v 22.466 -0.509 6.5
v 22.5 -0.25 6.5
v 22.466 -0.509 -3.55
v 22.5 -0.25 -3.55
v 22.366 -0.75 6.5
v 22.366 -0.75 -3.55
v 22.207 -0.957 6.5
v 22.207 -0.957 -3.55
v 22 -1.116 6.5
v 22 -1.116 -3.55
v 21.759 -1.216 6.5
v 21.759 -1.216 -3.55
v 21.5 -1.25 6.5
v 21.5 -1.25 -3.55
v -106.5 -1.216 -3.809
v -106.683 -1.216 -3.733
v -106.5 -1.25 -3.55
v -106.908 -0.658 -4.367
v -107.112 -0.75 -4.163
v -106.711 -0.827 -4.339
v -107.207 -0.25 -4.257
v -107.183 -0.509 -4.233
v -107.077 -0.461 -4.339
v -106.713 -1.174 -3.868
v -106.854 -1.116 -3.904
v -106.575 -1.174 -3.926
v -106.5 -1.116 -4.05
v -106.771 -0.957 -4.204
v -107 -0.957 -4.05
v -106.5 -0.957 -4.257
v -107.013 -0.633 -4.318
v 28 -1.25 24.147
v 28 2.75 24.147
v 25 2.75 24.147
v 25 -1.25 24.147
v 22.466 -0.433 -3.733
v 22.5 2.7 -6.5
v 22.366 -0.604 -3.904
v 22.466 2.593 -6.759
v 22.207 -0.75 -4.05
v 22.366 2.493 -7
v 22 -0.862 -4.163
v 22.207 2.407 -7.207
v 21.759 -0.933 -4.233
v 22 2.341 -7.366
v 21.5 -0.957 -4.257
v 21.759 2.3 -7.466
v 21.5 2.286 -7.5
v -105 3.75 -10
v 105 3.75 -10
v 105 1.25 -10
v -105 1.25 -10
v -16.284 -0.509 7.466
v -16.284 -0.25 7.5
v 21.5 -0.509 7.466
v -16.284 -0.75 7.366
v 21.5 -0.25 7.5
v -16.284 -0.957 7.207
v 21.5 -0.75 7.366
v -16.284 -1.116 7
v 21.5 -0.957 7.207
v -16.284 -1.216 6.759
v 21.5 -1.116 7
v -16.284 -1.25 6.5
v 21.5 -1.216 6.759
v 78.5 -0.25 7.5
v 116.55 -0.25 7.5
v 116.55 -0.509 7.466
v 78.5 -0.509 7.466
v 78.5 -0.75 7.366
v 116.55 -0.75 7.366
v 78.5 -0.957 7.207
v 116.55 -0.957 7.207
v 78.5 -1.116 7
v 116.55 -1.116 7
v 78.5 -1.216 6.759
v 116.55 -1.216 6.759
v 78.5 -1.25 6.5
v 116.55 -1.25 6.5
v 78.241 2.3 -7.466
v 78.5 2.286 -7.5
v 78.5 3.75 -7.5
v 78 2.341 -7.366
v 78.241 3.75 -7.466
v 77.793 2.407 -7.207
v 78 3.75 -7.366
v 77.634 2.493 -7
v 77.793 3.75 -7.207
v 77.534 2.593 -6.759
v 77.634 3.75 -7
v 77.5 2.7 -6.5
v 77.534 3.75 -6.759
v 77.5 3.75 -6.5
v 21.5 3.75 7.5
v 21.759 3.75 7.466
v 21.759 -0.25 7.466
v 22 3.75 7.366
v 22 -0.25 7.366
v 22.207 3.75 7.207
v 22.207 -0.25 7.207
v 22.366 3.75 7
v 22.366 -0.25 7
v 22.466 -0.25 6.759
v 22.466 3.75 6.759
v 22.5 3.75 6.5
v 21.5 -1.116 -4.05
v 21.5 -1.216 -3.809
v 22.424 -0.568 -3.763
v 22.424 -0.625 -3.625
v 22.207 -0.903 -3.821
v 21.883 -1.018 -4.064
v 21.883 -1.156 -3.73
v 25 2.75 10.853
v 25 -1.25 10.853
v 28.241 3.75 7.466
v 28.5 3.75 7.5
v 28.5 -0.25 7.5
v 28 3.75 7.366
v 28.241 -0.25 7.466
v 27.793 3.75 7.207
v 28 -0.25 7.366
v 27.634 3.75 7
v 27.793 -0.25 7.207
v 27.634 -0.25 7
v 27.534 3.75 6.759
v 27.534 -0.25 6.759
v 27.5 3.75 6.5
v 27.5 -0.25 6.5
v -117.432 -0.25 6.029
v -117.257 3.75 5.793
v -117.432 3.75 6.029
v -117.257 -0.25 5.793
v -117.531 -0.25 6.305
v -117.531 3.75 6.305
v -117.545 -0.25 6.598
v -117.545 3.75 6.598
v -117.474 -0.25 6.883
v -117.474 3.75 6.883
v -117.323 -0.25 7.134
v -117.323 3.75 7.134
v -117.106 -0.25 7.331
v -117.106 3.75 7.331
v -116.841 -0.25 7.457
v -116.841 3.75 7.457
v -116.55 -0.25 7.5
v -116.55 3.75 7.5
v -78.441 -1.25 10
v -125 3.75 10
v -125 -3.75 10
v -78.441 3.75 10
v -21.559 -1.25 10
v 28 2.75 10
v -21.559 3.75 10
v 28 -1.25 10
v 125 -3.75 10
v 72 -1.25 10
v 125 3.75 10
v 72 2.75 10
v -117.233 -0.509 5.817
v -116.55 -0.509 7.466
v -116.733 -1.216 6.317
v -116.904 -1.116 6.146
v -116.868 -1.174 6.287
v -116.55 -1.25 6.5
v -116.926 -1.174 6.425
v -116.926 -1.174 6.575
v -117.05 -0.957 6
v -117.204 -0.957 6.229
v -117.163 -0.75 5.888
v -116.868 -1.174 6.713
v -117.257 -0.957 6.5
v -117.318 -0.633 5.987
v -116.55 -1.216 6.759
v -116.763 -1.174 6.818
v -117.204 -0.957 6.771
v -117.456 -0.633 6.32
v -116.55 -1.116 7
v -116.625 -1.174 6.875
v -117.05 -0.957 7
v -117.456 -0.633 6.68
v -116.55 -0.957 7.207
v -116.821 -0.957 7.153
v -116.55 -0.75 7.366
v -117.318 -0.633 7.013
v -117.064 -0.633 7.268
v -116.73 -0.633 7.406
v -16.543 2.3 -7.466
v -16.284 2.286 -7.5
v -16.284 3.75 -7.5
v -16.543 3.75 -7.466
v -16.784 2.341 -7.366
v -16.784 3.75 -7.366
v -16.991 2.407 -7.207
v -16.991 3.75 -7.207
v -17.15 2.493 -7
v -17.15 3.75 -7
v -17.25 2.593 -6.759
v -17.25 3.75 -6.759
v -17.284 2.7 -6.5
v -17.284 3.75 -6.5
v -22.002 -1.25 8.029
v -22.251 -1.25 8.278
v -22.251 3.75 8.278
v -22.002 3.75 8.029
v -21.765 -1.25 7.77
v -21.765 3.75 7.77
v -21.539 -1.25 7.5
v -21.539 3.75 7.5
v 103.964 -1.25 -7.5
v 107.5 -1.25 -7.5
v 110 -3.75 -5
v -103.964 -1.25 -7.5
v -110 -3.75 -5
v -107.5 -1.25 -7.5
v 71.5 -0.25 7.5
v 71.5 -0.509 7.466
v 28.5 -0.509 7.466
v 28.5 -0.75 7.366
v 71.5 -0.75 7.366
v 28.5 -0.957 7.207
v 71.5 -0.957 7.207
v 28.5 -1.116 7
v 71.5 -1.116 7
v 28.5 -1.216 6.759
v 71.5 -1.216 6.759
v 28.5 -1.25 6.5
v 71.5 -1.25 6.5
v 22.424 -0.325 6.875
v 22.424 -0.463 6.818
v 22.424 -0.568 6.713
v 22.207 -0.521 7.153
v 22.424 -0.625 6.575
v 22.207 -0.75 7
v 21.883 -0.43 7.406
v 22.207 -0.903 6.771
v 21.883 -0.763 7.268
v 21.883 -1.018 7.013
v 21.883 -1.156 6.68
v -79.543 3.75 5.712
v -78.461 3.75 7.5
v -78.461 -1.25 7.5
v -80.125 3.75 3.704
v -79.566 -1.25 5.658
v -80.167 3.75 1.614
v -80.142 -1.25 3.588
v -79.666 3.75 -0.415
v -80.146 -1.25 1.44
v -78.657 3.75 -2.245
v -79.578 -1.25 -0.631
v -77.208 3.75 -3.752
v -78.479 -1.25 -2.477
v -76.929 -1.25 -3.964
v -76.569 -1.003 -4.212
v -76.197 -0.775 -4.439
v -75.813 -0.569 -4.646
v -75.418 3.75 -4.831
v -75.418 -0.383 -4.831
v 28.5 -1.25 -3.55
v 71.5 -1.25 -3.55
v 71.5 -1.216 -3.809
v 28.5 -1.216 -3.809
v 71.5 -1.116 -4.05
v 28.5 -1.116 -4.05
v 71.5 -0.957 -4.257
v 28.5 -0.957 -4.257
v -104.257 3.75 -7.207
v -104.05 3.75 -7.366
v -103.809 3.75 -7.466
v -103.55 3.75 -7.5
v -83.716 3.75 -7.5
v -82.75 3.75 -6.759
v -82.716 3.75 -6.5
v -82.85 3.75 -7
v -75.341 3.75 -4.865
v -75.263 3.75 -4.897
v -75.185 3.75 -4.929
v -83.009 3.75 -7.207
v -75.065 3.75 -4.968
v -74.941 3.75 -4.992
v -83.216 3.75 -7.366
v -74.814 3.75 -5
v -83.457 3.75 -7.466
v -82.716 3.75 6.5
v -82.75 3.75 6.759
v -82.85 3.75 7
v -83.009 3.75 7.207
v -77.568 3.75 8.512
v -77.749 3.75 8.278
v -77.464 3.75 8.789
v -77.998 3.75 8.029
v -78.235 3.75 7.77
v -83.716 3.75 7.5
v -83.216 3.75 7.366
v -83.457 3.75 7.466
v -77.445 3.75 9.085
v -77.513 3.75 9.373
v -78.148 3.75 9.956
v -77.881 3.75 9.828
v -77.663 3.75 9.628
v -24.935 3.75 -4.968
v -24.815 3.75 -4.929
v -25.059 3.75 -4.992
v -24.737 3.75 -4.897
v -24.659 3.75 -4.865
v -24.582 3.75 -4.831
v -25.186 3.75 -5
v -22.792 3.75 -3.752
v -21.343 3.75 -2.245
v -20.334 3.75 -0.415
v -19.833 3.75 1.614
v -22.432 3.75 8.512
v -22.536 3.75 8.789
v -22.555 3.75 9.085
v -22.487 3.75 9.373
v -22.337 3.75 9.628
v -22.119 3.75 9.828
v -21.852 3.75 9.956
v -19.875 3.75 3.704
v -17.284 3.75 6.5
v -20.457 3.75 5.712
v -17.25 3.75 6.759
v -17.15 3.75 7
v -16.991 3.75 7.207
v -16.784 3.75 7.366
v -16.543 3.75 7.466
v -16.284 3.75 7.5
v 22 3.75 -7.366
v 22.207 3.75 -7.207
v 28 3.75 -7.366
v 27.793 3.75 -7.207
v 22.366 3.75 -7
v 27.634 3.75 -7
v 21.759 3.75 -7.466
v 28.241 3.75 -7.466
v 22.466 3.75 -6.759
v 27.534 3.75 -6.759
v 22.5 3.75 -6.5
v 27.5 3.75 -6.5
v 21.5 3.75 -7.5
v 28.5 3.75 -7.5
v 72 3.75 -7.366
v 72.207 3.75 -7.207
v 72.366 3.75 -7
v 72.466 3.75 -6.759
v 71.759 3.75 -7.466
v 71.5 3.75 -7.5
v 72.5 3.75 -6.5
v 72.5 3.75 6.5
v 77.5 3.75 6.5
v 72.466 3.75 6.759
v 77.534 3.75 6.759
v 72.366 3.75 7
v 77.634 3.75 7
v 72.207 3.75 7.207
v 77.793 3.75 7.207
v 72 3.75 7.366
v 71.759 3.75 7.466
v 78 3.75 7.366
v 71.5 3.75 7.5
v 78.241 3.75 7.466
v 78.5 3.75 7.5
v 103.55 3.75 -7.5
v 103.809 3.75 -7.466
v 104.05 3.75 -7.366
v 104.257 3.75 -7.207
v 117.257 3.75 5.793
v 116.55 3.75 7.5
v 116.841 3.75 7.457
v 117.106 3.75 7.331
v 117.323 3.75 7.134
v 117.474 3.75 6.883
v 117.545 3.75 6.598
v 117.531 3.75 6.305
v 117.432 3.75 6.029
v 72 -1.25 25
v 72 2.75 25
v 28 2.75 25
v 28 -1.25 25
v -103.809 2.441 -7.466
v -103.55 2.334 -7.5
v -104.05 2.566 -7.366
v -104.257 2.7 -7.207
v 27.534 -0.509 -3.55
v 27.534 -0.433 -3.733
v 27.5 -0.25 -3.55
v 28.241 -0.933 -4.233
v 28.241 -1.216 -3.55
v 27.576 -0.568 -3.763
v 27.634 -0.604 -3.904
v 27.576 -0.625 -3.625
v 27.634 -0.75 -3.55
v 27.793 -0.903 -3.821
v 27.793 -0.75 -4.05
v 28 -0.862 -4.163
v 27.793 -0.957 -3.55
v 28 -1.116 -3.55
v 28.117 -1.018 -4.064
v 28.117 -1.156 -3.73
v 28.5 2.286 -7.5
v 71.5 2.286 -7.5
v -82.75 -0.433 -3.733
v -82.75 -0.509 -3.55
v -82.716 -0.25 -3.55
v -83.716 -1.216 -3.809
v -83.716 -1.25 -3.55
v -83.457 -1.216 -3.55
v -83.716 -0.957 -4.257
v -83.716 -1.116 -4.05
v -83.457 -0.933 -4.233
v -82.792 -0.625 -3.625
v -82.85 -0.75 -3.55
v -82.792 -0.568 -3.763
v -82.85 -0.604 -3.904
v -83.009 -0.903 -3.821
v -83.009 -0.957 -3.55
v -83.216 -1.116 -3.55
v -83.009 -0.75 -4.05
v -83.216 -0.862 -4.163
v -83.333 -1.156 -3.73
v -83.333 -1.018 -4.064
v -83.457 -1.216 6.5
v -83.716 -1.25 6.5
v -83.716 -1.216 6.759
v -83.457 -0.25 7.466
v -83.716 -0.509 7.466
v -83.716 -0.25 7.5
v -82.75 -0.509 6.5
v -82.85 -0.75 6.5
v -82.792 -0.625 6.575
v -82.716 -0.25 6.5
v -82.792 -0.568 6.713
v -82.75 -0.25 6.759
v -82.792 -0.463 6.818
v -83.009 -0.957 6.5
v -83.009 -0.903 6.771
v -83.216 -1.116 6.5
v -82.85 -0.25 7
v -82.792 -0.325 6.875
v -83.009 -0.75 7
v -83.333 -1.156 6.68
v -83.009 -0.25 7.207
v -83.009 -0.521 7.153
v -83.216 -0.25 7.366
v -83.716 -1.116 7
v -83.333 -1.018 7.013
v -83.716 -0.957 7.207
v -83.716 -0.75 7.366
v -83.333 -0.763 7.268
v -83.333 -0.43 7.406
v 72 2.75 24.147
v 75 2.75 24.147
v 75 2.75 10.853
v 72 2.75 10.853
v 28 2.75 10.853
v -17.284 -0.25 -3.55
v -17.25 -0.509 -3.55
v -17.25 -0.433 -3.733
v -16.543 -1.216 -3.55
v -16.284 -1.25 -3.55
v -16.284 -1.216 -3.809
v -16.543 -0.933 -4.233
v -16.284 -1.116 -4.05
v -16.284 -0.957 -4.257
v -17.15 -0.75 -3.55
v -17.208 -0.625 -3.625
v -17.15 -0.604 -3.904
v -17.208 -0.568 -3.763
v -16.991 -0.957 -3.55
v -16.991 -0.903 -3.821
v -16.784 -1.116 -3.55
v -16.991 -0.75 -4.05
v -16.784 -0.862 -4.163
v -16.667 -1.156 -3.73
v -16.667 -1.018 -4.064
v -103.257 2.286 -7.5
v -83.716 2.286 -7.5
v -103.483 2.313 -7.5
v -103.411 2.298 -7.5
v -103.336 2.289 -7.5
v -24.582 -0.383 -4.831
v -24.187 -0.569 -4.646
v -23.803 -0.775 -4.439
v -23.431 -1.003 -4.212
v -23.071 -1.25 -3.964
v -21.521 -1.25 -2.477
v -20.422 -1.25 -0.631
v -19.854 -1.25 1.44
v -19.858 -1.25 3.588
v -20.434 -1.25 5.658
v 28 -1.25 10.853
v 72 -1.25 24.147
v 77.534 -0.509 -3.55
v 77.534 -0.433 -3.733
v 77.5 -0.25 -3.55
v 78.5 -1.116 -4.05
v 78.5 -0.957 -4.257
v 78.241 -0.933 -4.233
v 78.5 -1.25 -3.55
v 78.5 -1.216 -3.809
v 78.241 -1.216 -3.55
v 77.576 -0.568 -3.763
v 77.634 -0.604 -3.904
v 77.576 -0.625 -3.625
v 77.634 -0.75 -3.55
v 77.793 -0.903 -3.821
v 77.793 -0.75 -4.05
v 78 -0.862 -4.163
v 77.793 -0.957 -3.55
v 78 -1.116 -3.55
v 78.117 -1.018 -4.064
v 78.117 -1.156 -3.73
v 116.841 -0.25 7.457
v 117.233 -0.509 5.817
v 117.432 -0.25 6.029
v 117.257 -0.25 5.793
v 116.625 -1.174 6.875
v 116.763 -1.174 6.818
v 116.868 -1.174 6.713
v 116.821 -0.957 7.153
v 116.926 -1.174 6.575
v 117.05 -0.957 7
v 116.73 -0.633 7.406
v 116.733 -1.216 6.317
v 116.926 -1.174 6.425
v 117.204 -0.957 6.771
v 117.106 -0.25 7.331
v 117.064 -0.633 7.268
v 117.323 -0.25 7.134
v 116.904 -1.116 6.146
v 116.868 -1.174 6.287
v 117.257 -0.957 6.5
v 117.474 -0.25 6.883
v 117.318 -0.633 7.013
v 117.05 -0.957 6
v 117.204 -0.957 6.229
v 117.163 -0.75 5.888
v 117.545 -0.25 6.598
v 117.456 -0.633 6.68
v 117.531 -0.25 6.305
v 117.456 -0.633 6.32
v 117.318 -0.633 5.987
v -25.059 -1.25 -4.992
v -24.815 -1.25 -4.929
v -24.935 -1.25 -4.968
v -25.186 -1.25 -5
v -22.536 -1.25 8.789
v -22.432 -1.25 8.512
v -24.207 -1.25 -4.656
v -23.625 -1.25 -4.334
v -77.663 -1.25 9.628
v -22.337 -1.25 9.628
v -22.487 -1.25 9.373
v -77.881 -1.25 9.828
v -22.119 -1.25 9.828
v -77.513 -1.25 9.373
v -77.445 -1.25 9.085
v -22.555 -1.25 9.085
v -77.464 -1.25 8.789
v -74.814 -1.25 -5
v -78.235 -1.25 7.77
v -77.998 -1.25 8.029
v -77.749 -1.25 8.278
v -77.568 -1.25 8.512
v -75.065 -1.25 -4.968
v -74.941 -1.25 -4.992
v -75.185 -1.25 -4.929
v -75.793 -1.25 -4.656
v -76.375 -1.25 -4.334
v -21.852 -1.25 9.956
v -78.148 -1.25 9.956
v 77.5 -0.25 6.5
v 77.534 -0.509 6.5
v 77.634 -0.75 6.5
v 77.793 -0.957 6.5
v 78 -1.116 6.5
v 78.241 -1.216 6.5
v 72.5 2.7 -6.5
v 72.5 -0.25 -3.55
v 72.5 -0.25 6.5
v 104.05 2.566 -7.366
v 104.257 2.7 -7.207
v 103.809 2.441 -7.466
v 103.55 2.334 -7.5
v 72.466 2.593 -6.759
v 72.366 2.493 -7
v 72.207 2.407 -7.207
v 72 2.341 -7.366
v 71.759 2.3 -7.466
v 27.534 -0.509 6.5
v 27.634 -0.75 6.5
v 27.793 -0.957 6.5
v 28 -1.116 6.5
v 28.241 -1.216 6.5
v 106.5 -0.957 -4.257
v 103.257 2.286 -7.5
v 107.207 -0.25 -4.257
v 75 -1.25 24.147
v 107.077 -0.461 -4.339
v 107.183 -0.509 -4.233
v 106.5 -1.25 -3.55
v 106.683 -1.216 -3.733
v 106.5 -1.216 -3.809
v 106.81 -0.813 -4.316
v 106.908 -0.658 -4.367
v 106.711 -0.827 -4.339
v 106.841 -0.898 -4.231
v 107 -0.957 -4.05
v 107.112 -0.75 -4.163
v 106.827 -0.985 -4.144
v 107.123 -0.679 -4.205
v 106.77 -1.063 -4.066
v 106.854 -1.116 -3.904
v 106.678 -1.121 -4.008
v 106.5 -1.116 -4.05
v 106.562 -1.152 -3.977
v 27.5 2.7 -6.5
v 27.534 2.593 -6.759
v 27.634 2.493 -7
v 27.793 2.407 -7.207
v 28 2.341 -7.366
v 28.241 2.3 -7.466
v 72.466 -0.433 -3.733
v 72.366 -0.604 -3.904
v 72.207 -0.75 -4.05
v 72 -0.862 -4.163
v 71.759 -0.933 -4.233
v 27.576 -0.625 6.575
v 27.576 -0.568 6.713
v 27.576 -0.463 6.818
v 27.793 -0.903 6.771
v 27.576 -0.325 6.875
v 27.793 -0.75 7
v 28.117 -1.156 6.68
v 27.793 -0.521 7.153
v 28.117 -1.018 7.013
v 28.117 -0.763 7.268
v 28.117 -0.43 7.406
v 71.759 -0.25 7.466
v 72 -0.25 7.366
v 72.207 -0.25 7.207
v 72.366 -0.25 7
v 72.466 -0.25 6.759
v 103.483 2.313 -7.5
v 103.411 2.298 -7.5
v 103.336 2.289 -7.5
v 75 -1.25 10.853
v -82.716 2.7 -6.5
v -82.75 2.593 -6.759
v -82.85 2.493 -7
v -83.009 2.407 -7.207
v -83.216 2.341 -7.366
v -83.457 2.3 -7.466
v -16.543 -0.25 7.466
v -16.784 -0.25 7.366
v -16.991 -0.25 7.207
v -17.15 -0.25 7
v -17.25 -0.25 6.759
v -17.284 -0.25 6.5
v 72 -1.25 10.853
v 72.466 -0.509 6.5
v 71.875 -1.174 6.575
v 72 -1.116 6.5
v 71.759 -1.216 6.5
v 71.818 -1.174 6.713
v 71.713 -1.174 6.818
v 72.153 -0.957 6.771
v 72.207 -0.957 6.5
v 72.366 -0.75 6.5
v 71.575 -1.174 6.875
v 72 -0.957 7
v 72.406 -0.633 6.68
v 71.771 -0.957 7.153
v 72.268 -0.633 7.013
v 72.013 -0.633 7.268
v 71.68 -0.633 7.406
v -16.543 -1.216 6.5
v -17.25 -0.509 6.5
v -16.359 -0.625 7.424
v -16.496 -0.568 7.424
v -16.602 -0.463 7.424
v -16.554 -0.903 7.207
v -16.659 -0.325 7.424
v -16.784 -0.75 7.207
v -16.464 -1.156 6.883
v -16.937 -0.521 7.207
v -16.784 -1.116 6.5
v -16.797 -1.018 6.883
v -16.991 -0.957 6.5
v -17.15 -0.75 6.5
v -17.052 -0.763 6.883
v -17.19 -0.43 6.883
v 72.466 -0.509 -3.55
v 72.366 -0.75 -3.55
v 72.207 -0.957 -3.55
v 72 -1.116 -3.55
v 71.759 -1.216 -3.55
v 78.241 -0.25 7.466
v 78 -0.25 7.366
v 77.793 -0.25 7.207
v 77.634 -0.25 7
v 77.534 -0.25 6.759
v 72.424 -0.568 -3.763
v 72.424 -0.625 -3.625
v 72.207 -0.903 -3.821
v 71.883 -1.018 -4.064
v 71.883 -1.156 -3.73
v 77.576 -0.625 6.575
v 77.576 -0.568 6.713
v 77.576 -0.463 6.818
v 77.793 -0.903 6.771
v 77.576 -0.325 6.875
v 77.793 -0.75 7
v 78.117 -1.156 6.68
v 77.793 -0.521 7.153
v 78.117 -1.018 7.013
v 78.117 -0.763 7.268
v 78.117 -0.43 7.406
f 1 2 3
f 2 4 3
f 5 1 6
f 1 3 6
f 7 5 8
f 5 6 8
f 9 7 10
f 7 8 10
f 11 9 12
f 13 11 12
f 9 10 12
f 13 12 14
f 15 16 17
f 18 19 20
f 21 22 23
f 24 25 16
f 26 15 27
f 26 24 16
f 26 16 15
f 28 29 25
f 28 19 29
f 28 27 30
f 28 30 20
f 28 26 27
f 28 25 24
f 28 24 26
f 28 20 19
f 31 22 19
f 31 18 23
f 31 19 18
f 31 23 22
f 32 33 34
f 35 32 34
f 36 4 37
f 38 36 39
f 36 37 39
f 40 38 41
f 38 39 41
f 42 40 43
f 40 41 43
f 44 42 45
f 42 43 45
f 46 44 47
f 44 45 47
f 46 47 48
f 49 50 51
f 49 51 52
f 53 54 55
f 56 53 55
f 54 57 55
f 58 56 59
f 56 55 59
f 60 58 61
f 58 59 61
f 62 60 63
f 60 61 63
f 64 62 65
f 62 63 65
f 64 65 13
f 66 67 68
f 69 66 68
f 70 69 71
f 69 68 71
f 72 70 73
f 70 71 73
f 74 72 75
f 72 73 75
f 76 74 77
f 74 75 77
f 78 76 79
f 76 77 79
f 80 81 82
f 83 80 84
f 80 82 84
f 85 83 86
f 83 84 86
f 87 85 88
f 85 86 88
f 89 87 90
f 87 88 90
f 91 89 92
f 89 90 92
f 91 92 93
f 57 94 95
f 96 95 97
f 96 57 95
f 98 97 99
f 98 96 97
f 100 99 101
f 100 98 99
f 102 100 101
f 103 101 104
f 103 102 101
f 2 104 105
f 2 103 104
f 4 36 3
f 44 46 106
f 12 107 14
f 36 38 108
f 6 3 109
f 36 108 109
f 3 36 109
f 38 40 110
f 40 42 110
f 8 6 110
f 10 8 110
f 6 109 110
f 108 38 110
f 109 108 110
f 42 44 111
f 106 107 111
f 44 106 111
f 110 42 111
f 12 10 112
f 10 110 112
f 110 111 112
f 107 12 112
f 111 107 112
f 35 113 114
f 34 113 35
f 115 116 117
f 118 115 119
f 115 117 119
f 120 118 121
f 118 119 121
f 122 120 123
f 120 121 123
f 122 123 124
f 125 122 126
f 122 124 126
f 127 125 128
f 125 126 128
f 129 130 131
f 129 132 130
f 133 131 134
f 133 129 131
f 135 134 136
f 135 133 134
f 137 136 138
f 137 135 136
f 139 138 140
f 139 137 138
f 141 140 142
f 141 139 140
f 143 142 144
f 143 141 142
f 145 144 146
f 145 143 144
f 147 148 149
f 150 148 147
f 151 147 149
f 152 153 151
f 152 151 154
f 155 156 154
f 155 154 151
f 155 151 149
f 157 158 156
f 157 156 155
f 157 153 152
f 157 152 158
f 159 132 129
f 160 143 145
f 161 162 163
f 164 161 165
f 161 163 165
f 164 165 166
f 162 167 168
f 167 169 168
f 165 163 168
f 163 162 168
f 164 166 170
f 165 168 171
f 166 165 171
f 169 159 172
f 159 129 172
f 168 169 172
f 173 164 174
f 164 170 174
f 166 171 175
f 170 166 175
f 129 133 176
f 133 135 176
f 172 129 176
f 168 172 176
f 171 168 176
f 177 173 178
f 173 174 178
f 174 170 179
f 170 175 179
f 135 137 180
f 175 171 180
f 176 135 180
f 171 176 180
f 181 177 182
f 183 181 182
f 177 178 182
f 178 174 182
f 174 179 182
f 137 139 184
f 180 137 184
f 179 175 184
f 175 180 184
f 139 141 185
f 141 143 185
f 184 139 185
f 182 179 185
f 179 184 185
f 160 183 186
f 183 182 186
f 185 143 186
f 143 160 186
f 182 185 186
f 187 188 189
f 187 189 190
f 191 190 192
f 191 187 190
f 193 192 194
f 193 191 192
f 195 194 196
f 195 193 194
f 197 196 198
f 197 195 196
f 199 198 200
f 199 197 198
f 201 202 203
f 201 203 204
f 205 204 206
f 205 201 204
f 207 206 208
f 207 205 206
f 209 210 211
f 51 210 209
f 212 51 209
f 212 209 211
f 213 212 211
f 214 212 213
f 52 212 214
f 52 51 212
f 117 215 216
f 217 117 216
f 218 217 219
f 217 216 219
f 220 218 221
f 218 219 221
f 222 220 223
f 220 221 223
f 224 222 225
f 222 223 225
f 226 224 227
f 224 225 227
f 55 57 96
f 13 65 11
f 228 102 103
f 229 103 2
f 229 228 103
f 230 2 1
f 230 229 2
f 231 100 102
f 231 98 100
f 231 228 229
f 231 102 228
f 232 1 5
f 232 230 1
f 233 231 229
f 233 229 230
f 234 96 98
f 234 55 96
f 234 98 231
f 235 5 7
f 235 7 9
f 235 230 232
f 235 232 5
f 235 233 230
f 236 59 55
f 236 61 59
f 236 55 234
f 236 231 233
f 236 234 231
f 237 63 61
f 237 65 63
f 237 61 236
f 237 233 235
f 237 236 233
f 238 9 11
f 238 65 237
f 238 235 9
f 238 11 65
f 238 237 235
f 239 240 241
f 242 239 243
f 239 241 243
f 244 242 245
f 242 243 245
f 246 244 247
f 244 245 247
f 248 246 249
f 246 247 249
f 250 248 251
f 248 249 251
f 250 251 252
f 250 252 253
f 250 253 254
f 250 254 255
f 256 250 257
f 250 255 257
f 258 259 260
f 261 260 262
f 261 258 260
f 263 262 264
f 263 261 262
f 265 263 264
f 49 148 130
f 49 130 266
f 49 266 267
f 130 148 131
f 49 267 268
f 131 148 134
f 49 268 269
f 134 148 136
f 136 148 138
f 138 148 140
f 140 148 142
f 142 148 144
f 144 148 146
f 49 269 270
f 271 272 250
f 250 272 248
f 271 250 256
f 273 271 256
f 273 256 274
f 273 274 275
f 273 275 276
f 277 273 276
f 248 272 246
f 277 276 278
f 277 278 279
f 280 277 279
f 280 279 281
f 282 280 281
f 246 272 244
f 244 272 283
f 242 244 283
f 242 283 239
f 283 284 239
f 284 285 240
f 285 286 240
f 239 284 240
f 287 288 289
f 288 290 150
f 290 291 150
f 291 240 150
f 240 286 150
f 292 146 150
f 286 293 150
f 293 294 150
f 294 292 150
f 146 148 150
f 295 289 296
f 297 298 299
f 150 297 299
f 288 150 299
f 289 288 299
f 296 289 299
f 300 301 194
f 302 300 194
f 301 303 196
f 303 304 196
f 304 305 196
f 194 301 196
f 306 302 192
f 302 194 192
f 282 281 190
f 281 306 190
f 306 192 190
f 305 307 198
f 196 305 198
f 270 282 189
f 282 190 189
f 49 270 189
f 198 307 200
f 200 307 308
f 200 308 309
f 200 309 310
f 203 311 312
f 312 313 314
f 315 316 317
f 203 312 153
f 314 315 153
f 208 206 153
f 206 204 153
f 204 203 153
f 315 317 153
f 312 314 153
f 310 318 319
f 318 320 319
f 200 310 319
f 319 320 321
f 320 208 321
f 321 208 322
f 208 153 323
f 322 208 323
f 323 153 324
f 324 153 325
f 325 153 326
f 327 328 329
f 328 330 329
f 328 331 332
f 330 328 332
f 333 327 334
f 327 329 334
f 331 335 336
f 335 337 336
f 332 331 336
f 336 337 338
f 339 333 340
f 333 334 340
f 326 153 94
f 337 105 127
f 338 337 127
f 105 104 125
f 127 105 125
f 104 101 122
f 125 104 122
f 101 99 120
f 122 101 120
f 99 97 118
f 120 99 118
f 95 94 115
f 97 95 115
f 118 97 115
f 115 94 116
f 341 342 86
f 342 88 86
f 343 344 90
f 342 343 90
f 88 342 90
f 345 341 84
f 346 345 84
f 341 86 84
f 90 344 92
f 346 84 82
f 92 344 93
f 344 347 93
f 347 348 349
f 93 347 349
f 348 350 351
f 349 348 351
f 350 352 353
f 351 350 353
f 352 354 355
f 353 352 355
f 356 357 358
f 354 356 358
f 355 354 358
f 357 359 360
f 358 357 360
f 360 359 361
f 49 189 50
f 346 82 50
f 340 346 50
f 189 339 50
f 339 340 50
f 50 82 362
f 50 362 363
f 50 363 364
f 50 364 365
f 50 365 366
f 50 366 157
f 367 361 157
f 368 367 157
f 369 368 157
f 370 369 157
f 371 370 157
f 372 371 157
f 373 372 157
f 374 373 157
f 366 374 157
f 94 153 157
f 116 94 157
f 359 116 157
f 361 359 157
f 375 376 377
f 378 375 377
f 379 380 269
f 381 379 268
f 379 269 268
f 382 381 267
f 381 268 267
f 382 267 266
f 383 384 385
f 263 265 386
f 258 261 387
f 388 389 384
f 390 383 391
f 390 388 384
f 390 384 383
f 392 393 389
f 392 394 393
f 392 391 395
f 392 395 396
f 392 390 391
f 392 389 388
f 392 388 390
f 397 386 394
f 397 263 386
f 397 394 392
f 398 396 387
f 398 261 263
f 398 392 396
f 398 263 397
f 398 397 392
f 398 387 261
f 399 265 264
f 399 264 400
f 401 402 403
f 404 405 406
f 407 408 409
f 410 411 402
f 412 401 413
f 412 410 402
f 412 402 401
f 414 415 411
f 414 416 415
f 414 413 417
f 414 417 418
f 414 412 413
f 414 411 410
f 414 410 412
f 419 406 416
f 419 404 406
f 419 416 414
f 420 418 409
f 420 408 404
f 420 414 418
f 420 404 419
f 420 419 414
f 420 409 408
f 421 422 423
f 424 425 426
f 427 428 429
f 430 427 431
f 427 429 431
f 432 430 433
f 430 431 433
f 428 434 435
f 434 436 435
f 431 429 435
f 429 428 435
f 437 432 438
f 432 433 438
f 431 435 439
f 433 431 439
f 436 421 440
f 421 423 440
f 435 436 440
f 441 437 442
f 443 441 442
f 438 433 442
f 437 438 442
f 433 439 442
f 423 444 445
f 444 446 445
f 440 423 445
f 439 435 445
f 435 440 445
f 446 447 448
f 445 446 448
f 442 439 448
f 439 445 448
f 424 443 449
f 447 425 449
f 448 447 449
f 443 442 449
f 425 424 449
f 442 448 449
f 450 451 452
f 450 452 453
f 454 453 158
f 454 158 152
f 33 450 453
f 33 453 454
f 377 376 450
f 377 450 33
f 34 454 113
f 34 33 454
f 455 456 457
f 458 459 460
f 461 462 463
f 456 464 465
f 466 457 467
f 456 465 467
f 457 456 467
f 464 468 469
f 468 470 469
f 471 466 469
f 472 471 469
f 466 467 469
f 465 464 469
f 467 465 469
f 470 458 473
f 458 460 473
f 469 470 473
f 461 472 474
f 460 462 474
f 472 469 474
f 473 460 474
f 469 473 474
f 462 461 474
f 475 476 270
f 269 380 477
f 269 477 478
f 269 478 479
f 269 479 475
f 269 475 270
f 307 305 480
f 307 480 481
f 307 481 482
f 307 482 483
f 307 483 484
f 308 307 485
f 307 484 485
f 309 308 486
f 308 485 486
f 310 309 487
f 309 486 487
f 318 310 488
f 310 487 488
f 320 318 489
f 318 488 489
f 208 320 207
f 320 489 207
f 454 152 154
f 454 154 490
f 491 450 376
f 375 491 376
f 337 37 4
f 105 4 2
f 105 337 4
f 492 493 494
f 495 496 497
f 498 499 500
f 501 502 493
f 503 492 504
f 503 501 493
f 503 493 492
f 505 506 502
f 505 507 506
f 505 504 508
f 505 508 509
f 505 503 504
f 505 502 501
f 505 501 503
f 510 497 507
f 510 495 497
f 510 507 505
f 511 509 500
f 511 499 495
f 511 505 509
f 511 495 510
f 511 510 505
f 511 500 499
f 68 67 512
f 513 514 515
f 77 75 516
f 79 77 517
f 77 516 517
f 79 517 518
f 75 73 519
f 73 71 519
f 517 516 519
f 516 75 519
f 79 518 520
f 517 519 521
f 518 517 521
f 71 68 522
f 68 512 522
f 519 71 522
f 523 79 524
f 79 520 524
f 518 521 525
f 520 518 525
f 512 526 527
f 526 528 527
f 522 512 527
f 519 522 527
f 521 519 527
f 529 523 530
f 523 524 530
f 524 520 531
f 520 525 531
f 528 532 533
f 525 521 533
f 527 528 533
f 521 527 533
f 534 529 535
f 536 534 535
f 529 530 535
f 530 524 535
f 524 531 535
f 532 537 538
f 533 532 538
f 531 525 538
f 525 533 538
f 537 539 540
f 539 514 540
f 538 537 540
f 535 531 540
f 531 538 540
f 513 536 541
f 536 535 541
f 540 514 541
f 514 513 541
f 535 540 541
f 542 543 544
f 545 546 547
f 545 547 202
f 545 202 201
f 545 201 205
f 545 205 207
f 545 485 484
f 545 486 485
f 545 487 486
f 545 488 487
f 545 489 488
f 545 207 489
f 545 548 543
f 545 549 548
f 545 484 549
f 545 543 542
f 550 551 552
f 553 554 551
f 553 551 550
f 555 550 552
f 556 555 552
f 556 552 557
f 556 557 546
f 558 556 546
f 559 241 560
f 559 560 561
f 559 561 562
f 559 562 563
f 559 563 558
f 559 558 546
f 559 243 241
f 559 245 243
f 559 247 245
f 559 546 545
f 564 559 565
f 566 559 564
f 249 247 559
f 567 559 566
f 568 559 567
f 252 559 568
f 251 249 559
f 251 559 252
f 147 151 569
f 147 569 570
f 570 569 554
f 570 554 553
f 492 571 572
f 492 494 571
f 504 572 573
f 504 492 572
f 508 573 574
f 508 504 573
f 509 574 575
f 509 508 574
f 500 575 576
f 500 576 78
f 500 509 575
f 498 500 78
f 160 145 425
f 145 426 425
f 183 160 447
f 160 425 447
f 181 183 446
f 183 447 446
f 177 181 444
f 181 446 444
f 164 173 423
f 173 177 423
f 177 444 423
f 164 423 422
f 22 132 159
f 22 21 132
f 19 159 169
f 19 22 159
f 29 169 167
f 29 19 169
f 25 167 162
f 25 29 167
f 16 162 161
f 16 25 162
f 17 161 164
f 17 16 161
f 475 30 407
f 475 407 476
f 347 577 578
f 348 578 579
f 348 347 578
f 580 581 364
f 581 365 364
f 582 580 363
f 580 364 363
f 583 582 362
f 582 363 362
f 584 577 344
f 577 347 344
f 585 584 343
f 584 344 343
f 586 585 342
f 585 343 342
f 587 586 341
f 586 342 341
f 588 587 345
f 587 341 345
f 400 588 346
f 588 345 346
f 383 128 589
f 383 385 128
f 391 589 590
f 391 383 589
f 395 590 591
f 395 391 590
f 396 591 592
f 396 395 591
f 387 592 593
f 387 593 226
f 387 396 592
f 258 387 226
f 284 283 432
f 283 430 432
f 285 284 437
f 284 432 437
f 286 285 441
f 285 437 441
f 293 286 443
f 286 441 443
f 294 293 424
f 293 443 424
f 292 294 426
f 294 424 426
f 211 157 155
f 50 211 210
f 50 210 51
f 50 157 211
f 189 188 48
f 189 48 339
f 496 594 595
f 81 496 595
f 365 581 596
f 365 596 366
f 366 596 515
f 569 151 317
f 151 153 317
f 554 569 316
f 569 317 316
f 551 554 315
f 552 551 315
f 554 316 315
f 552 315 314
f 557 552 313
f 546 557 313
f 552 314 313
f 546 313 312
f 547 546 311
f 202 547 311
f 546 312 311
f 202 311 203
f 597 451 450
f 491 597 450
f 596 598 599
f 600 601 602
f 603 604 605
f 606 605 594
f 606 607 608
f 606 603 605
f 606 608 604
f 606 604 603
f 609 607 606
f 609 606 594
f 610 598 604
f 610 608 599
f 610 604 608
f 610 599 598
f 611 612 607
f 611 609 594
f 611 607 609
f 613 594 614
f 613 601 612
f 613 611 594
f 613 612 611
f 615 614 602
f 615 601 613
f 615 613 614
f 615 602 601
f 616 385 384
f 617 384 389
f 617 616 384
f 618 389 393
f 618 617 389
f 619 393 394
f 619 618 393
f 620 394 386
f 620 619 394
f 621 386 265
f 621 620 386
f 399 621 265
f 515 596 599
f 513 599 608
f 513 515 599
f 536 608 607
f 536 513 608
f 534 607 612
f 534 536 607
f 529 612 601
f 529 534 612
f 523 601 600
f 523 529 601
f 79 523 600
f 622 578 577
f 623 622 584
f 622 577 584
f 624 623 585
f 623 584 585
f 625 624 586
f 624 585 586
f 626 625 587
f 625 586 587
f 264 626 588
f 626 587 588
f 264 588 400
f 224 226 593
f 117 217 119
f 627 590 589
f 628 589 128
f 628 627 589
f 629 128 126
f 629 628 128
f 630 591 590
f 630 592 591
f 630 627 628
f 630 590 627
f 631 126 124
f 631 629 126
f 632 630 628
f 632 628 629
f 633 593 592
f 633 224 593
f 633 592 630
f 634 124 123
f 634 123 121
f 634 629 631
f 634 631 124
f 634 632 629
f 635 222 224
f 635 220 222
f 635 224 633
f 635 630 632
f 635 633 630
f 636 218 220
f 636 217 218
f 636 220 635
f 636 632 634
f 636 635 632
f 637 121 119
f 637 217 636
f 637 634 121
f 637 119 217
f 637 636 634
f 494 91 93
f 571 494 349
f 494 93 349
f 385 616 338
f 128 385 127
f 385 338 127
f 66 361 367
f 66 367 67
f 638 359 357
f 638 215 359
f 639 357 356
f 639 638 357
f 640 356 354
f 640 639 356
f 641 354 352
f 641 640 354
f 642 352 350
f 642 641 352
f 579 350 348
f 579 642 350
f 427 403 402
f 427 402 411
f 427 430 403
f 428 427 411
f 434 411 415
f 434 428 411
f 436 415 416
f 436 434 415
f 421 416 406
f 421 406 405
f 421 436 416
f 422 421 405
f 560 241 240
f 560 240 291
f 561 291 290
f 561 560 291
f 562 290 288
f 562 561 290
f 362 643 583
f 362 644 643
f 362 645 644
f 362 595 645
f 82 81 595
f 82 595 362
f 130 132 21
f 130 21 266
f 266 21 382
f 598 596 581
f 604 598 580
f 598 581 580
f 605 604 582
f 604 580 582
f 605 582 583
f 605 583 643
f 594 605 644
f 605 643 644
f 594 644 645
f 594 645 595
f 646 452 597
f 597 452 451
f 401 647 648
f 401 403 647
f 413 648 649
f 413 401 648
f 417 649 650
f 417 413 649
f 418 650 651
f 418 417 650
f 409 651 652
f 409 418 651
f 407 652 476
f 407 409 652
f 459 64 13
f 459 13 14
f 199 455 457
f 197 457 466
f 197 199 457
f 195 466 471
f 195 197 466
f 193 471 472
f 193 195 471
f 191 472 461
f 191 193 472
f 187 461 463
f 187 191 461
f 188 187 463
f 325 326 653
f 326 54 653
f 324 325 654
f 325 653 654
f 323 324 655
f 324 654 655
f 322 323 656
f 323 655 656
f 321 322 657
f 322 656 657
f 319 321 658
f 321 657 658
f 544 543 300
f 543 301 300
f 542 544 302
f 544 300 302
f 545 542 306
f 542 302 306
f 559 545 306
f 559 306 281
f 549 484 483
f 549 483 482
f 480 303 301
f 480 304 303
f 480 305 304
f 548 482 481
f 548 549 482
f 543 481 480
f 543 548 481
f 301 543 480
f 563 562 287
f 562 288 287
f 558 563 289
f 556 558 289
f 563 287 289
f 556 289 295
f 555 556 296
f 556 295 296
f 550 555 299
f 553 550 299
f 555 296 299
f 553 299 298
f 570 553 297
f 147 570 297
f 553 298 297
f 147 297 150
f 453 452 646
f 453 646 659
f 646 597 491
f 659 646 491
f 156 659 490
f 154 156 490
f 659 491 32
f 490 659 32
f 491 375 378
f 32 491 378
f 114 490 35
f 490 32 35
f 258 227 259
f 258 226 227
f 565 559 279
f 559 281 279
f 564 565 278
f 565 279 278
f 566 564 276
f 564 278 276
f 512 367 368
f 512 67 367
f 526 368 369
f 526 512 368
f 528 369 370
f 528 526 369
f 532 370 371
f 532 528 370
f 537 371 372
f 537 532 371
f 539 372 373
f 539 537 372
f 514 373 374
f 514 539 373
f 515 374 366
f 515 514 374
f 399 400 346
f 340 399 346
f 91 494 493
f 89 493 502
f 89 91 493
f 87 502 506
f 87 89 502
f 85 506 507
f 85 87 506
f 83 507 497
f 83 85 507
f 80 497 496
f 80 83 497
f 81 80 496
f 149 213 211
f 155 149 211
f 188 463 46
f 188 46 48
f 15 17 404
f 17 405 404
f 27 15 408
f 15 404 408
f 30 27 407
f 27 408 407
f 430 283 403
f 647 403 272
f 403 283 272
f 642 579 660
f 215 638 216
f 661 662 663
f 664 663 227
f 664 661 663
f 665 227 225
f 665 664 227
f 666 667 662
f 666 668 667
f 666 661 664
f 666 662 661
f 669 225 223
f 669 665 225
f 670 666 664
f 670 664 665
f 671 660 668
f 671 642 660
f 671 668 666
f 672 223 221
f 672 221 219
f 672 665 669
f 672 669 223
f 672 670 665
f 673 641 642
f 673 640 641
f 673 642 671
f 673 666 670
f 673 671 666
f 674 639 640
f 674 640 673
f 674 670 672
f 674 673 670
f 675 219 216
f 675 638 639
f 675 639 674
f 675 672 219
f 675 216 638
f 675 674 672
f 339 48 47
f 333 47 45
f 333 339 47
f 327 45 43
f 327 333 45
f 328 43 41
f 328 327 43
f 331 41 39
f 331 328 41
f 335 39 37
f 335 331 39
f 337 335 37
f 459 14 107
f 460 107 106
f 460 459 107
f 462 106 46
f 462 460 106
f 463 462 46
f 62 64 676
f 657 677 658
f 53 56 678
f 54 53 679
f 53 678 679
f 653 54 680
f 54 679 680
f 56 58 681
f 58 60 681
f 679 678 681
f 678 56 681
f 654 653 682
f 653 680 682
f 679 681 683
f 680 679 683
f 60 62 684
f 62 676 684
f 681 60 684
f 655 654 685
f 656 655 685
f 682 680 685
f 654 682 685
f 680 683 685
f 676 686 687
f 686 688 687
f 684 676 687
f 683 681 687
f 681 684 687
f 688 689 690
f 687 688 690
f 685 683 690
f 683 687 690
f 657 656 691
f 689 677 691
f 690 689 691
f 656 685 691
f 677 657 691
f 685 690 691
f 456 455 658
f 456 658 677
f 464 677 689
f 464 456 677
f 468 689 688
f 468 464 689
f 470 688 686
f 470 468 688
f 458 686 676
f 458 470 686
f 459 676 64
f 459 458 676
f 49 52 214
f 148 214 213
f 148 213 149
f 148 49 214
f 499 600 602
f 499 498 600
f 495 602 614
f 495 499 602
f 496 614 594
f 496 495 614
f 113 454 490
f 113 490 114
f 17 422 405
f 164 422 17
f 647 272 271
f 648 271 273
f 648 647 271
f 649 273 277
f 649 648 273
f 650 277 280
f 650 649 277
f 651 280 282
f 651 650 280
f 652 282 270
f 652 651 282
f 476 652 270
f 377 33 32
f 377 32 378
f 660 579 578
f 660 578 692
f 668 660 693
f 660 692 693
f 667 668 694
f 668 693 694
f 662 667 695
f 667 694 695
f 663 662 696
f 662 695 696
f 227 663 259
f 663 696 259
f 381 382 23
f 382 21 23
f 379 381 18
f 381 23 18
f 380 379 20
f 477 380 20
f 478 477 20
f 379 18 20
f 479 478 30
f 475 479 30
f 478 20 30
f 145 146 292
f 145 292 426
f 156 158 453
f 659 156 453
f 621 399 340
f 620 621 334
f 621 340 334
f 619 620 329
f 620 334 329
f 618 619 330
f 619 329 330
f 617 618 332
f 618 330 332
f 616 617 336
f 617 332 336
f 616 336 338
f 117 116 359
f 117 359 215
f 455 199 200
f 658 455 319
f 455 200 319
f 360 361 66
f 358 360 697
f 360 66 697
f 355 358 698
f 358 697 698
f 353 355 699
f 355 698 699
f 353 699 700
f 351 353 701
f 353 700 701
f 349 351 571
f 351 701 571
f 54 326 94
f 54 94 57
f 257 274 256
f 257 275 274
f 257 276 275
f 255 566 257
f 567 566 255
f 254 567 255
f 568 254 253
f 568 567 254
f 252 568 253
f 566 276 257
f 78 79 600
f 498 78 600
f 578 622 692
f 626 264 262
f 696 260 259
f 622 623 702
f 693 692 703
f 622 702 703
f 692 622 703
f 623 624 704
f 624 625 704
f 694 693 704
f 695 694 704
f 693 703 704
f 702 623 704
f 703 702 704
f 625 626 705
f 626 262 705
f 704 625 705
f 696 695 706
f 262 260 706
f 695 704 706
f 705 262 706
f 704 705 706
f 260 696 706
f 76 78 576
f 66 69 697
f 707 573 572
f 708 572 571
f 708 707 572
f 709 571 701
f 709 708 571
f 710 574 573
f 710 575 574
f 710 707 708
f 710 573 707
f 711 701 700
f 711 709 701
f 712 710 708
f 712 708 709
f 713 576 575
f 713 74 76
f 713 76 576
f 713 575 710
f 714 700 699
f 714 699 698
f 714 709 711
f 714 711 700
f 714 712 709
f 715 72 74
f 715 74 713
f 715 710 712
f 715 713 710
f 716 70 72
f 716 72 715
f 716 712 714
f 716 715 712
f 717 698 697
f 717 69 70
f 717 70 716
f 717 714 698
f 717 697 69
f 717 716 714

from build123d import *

# Parameters (mm, degrees)
BOSS_EXTRUDE1_DEPTH     = 3.75
SKETCH3_W               = 50
SKETCH3_H               = 15
BOSS_EXTRUDE3_DEPTH     = 4
CUT_EXTRUDE1_DEPTH      = 128.641098397
CUT_EXTRUDE1_DEPTH_BACK = 4
CHAMFER1_SIZE           = 5
SKETCH7_W               = 3
SKETCH7_H               = 0.853193318
CUT_EXTRUDE2_DEPTH      = 128.641098397
SHELL1_START            = -17.283882181
SHELL1_DEPTH            = 121.248348275
SHELL1_START_2          = -103.964466094
SHELL1_2_DEPTH          = 21.248348275
SHELL1_START_3          = -118.964466094
SHELL1_3_DEPTH          = 43.546786157
SHELL1_START_4          = -24.582320063
SHELL1_4_DEPTH          = 143.546786157
SHELL1_START_5          = -1.25
SHELL1_5_DEPTH          = 5
BOSS_EXTRUDE4_REACH     = 129.696
RIB1_REACH              = 129.696
SKETCH5_WALLS_W         = 5
SKETCH5_WALLS_H         = 272.391855782
FILLET1_R               = 1
FILLET3_R               = 1


with BuildPart() as part:
    # Sketch1 → Boss-Extrude1 (new, symmetric)
    with BuildSketch(Plane(origin=(0, 0, 0), x_dir=(1, 0, 0), z_dir=(0, 1, 0))):
        Polygon((-125, -10), (125, -10), (105, 10), (-105, 10), align=None)
    extrude(amount=BOSS_EXTRUDE1_DEPTH, both=True)

    # Sketch3 → Boss-Extrude3 (add)
    with BuildSketch(Plane(origin=(0, 2.75, 0), x_dir=(-1, 0, 0), z_dir=(0, 1, 0))):
        with Locations((-50, 17.5)):
            Rectangle(SKETCH3_W, SKETCH3_H)
    extrude(amount=-BOSS_EXTRUDE3_DEPTH)

    # Sketch4 → Cut-Extrude1 (cut, two sides: drawn at the far end of the back side and taken through both)
    with BuildSketch(Plane(origin=(0, 2.75, 0), x_dir=(-1, 0, 0), z_dir=(0, 1, 0)).offset(-CUT_EXTRUDE1_DEPTH_BACK)):
        with BuildLine():
            Line((75, 10), (25, 10))
            ThreePointArc((25, 10), (19.783882181, 2.5), (25, -5))
            Line((25, -5), (75, -5))
            ThreePointArc((75, -5), (80.216117819, 2.5), (75, 10))
        make_face()
    extrude(amount=CUT_EXTRUDE1_DEPTH + CUT_EXTRUDE1_DEPTH_BACK, mode=Mode.SUBTRACT)

    # Chamfer1
    chamfer1_edges = [part.edges().sort_by_distance(p)[0] for p in [
        (0, -3.75, -10),
    ]]
    chamfer(chamfer1_edges, length=CHAMFER1_SIZE)

    # Sketch7 → Cut-Extrude2 (cut, through all)
    with BuildSketch(Plane(origin=(0, 2.75, 0), x_dir=(-1, 0, 0), z_dir=(0, 1, 0))):
        with Locations((-73.5, 24.573403341)):
            Rectangle(SKETCH7_W, SKETCH7_H)
        with Locations((-73.5, 10.426596659)):
            Rectangle(SKETCH7_W, SKETCH7_H)
        with Locations((-26.5, 10.426596659)):
            Rectangle(SKETCH7_W, SKETCH7_H)
        with Locations((-26.5, 24.573403341)):
            Rectangle(SKETCH7_W, SKETCH7_H)
    extrude(amount=-CUT_EXTRUDE2_DEPTH, mode=Mode.SUBTRACT)

    # Shell1: read off the stored shape, not the designer's step
    # Shell1 outline → Shell1 (cut)
    with BuildSketch(Plane.YZ.offset(SHELL1_START)):
        Polygon((-1.25, 7.5), (-1.25, -3.964466094), (2.285533906, -7.5), (3.75, -7.5), (3.75, 7.5), align=None)
    extrude(amount=SHELL1_DEPTH, mode=Mode.SUBTRACT)

    # Shell1 2 outline → Shell1 2 (cut)
    with BuildSketch(Plane.YZ.offset(SHELL1_START_2)):
        Polygon((-1.25, 7.5), (-1.25, -3.964466094), (2.285533906, -7.5), (3.75, -7.5), (3.75, 7.5), align=None)
    extrude(amount=SHELL1_2_DEPTH, mode=Mode.SUBTRACT)

    # Shell1 3 outline → Shell1 3 (cut)
    with BuildSketch(Plane.YZ.offset(SHELL1_START_3)):
        Polygon((-1.25, 7.5), (-1.25, -3.964466094), (2.285533906, -7.5), (3.75, -7.5), (3.75, 7.5), align=None)
    extrude(amount=SHELL1_3_DEPTH, mode=Mode.SUBTRACT)

    # Shell1 4 outline → Shell1 4 (cut)
    with BuildSketch(Plane.YZ.offset(SHELL1_START_4)):
        Polygon((-1.25, 7.5), (-1.25, -3.964466094), (2.285533906, -7.5), (3.75, -7.5), (3.75, 7.5), align=None)
    extrude(amount=SHELL1_4_DEPTH, mode=Mode.SUBTRACT)

    # Shell1 5 outline → Shell1 5 (add)
    with BuildSketch(Plane(origin=(0, 0, 0), x_dir=(1, 0, 0), z_dir=(0, 1, 0)).offset(SHELL1_START_5)):
        Polygon((-107.5, 7.5), (-118.964466094, -3.964466094), (-118.964466094, -7.5), (-103.964466094, 7.5), align=None)
        with BuildLine():
            ThreePointArc((-75.417679937, 7.5), (-81.958045751, 1.417249055), (-81.449210475, -7.5))
            Line((-81.449210475, -7.5), (-78.461115817, -7.5))
            ThreePointArc((-78.461115817, -7.5), (-79.983065249, -0.58309426), (-75.417679937, 4.831439149))
            Line((-75.417679937, 4.831439149), (-75.417679937, 7.5))
        make_face()
        Polygon((118.964466094, -3.964466094), (107.5, 7.5), (103.964466094, 7.5), (118.964466094, -7.5), align=None)
        with BuildLine():
            ThreePointArc((-18.550789525, -7.5), (-18.041954249, 1.417249055), (-24.582320063, 7.5))
            Line((-24.582320063, 7.5), (-24.582320063, 4.831439149))
            ThreePointArc((-24.582320063, 4.831439149), (-20.016934751, -0.58309426), (-21.538884183, -7.5))
            Line((-21.538884183, -7.5), (-18.550789525, -7.5))
        make_face()
    extrude(amount=SHELL1_5_DEPTH)

    # Sketch6 → Boss-Extrude4 (add, up to next)
    with BuildSketch(Plane.XZ.offset(-3.75), mode=Mode.PRIVATE) as boss_extrude4_sk1:
        with BuildLine():
            Line((-17.283882181, -7.5), (-17.283882181, 2.500000029))
            ThreePointArc((-17.283882181, 2.500000029), (-19.302537873, -3.69005644), (-24.582320063, -7.5))
            Line((-24.582320063, -7.5), (-17.283882181, -7.5))
        make_face()
    boss_extrude4_tool1 = extrude(boss_extrude4_sk1.sketch, amount=BOSS_EXTRUDE4_REACH, mode=Mode.PRIVATE) - part.part
    # Sketch6 → Boss-Extrude4 (add, up to next)
    with BuildSketch(Plane.XZ.offset(-3.75), mode=Mode.PRIVATE) as boss_extrude4_sk2:
        with BuildLine():
            Line((-17.283882181, 2.500000029), (-17.283882181, 7.5))
            Line((-17.283882181, 7.5), (-18.550789525, 7.5))
            ThreePointArc((-18.550789525, 7.5), (-17.605535736, 5.079004387), (-17.283882181, 2.500000029))
        make_face()
    boss_extrude4_tool2 = extrude(boss_extrude4_sk2.sketch, amount=BOSS_EXTRUDE4_REACH, mode=Mode.PRIVATE) - part.part
    # Sketch6 → Boss-Extrude4 (add, up to next)
    with BuildSketch(Plane.XZ.offset(-3.75), mode=Mode.PRIVATE) as boss_extrude4_sk3:
        with BuildLine():
            Line((-82.716117819, 7.5), (-82.716117819, 2.499999956))
            ThreePointArc((-82.716117819, 2.499999956), (-82.394464273, 5.079004351), (-81.449210475, 7.5))
            Line((-81.449210475, 7.5), (-82.716117819, 7.5))
        make_face()
    boss_extrude4_tool3 = extrude(boss_extrude4_sk3.sketch, amount=BOSS_EXTRUDE4_REACH, mode=Mode.PRIVATE) - part.part
    # Sketch6 → Boss-Extrude4 (add, up to next)
    with BuildSketch(Plane.XZ.offset(-3.75), mode=Mode.PRIVATE) as boss_extrude4_sk4:
        with BuildLine():
            Line((-82.716117819, -7.5), (-75.417679937, -7.5))
            ThreePointArc((-75.417679937, -7.5), (-80.697462105, -3.69005647), (-82.716117819, 2.499999956))
            Line((-82.716117819, 2.499999956), (-82.716117819, -7.5))
        make_face()
    boss_extrude4_tool4 = extrude(boss_extrude4_sk4.sketch, amount=BOSS_EXTRUDE4_REACH, mode=Mode.PRIVATE) - part.part
    add(boss_extrude4_tool1.solids().sort_by_distance((-19.229077, 3.75, -5.202593))[0])
    add(boss_extrude4_tool2.solids().sort_by_distance((-17.659672, 3.75, 6.265582))[0])
    add(boss_extrude4_tool3.solids().sort_by_distance((-82.340328, 3.75, 6.265582))[0])
    add(boss_extrude4_tool4.solids().sort_by_distance((-80.770923, 3.75, -5.202593))[0])

    # Sketch5 walls → Rib1 (add, up to next)
    with BuildSketch(Plane.XZ.offset(-3.75), mode=Mode.PRIVATE) as rib1_sk1:
        with Locations((75, 0)):
            Rectangle(SKETCH5_WALLS_W, SKETCH5_WALLS_H)
    rib1_tool1 = extrude(rib1_sk1.sketch, amount=RIB1_REACH, mode=Mode.PRIVATE) - part.part
    # Sketch5 walls → Rib1 (add, up to next)
    with BuildSketch(Plane.XZ.offset(-3.75), mode=Mode.PRIVATE) as rib1_sk2:
        with Locations((25, 0)):
            Rectangle(SKETCH5_WALLS_W, SKETCH5_WALLS_H)
    rib1_tool2 = extrude(rib1_sk2.sketch, amount=RIB1_REACH, mode=Mode.PRIVATE) - part.part
    add(rib1_tool1.solids().sort_by_distance((75, 3.75, 0))[0])
    add(rib1_tool2.solids().sort_by_distance((25, 3.75, 0))[0])

    # Fillet1
    fillet1_edges = [part.edges().sort_by_distance(p)[0] for p in [
        (113.232233047, -1.25, 1.767766953),
        (105.732233047, 0.517766953, -5.732233047),
        (118.964466094, 1.25, 7.5),
        (103.964466094, 3.017766953, -7.5),
        (-103.964466094, 3.017766953, -7.5),
        (-105.732233047, 0.517766953, -5.732233047),
        (-113.232233047, -1.25, 1.767766953),
        (-100.840291956, -1.25, 7.5),
        (-118.964466094, 1.25, 7.5),
        (-95.108058909, -1.25, -3.964466094),
        (2.608058909, -1.25, -3.964466094),
        (-17.283882181, -1.25, 1.767766953),
        (-17.283882181, 0.517766953, -5.732233047),
        (-17.283882181, 3.017766953, -7.5),
        (2.608058909, -1.25, 7.5),
        (-17.283882181, 1.25, 7.5),
        (-82.716117819, -1.25, 1.767766953),
        (-82.716117819, 1.25, 7.5),
        (-82.716117819, 0.517766953, -5.732233047),
        (-82.716117819, 3.017766953, -7.5),
        (92.5, -1.25, -3.964466094),
        (77.5, 0.517766953, -5.732233047),
        (72.5, 0.517766953, -5.732233047),
        (98.232233047, -1.25, 7.5),
        (72.5, 1.25, 7.5),
        (77.5, -1.25, 1.767766953),
        (72.5, -1.25, 1.767766953),
        (72.5, 3.017766953, -7.5),
        (77.5, 1.25, 7.5),
        (77.5, 3.017766953, -7.5),
        (50, -1.25, -3.964466094),
        (27.5, 0.517766953, -5.732233047),
        (22.5, 0.517766953, -5.732233047),
        (50, -1.25, 7.5),
        (27.5, -1.25, 1.767766953),
        (22.5, 1.25, 7.5),
        (22.5, -1.25, 1.767766953),
        (22.5, 3.017766953, -7.5),
        (27.5, 1.25, 7.5),
        (27.5, 3.017766953, -7.5),
    ]]
    fillet(fillet1_edges, radius=FILLET1_R)

    # Fillet3
    fillet3_edges = [part.edges().sort_by_distance(p)[0] for p in [
        (-25, 1.25, 10),
        (-25, 1.25, -5),
        (-75, 1.25, -5),
        (-75, 1.25, 10),
    ]]
    fillet(fillet3_edges, radius=FILLET3_R)


solid = part.part
